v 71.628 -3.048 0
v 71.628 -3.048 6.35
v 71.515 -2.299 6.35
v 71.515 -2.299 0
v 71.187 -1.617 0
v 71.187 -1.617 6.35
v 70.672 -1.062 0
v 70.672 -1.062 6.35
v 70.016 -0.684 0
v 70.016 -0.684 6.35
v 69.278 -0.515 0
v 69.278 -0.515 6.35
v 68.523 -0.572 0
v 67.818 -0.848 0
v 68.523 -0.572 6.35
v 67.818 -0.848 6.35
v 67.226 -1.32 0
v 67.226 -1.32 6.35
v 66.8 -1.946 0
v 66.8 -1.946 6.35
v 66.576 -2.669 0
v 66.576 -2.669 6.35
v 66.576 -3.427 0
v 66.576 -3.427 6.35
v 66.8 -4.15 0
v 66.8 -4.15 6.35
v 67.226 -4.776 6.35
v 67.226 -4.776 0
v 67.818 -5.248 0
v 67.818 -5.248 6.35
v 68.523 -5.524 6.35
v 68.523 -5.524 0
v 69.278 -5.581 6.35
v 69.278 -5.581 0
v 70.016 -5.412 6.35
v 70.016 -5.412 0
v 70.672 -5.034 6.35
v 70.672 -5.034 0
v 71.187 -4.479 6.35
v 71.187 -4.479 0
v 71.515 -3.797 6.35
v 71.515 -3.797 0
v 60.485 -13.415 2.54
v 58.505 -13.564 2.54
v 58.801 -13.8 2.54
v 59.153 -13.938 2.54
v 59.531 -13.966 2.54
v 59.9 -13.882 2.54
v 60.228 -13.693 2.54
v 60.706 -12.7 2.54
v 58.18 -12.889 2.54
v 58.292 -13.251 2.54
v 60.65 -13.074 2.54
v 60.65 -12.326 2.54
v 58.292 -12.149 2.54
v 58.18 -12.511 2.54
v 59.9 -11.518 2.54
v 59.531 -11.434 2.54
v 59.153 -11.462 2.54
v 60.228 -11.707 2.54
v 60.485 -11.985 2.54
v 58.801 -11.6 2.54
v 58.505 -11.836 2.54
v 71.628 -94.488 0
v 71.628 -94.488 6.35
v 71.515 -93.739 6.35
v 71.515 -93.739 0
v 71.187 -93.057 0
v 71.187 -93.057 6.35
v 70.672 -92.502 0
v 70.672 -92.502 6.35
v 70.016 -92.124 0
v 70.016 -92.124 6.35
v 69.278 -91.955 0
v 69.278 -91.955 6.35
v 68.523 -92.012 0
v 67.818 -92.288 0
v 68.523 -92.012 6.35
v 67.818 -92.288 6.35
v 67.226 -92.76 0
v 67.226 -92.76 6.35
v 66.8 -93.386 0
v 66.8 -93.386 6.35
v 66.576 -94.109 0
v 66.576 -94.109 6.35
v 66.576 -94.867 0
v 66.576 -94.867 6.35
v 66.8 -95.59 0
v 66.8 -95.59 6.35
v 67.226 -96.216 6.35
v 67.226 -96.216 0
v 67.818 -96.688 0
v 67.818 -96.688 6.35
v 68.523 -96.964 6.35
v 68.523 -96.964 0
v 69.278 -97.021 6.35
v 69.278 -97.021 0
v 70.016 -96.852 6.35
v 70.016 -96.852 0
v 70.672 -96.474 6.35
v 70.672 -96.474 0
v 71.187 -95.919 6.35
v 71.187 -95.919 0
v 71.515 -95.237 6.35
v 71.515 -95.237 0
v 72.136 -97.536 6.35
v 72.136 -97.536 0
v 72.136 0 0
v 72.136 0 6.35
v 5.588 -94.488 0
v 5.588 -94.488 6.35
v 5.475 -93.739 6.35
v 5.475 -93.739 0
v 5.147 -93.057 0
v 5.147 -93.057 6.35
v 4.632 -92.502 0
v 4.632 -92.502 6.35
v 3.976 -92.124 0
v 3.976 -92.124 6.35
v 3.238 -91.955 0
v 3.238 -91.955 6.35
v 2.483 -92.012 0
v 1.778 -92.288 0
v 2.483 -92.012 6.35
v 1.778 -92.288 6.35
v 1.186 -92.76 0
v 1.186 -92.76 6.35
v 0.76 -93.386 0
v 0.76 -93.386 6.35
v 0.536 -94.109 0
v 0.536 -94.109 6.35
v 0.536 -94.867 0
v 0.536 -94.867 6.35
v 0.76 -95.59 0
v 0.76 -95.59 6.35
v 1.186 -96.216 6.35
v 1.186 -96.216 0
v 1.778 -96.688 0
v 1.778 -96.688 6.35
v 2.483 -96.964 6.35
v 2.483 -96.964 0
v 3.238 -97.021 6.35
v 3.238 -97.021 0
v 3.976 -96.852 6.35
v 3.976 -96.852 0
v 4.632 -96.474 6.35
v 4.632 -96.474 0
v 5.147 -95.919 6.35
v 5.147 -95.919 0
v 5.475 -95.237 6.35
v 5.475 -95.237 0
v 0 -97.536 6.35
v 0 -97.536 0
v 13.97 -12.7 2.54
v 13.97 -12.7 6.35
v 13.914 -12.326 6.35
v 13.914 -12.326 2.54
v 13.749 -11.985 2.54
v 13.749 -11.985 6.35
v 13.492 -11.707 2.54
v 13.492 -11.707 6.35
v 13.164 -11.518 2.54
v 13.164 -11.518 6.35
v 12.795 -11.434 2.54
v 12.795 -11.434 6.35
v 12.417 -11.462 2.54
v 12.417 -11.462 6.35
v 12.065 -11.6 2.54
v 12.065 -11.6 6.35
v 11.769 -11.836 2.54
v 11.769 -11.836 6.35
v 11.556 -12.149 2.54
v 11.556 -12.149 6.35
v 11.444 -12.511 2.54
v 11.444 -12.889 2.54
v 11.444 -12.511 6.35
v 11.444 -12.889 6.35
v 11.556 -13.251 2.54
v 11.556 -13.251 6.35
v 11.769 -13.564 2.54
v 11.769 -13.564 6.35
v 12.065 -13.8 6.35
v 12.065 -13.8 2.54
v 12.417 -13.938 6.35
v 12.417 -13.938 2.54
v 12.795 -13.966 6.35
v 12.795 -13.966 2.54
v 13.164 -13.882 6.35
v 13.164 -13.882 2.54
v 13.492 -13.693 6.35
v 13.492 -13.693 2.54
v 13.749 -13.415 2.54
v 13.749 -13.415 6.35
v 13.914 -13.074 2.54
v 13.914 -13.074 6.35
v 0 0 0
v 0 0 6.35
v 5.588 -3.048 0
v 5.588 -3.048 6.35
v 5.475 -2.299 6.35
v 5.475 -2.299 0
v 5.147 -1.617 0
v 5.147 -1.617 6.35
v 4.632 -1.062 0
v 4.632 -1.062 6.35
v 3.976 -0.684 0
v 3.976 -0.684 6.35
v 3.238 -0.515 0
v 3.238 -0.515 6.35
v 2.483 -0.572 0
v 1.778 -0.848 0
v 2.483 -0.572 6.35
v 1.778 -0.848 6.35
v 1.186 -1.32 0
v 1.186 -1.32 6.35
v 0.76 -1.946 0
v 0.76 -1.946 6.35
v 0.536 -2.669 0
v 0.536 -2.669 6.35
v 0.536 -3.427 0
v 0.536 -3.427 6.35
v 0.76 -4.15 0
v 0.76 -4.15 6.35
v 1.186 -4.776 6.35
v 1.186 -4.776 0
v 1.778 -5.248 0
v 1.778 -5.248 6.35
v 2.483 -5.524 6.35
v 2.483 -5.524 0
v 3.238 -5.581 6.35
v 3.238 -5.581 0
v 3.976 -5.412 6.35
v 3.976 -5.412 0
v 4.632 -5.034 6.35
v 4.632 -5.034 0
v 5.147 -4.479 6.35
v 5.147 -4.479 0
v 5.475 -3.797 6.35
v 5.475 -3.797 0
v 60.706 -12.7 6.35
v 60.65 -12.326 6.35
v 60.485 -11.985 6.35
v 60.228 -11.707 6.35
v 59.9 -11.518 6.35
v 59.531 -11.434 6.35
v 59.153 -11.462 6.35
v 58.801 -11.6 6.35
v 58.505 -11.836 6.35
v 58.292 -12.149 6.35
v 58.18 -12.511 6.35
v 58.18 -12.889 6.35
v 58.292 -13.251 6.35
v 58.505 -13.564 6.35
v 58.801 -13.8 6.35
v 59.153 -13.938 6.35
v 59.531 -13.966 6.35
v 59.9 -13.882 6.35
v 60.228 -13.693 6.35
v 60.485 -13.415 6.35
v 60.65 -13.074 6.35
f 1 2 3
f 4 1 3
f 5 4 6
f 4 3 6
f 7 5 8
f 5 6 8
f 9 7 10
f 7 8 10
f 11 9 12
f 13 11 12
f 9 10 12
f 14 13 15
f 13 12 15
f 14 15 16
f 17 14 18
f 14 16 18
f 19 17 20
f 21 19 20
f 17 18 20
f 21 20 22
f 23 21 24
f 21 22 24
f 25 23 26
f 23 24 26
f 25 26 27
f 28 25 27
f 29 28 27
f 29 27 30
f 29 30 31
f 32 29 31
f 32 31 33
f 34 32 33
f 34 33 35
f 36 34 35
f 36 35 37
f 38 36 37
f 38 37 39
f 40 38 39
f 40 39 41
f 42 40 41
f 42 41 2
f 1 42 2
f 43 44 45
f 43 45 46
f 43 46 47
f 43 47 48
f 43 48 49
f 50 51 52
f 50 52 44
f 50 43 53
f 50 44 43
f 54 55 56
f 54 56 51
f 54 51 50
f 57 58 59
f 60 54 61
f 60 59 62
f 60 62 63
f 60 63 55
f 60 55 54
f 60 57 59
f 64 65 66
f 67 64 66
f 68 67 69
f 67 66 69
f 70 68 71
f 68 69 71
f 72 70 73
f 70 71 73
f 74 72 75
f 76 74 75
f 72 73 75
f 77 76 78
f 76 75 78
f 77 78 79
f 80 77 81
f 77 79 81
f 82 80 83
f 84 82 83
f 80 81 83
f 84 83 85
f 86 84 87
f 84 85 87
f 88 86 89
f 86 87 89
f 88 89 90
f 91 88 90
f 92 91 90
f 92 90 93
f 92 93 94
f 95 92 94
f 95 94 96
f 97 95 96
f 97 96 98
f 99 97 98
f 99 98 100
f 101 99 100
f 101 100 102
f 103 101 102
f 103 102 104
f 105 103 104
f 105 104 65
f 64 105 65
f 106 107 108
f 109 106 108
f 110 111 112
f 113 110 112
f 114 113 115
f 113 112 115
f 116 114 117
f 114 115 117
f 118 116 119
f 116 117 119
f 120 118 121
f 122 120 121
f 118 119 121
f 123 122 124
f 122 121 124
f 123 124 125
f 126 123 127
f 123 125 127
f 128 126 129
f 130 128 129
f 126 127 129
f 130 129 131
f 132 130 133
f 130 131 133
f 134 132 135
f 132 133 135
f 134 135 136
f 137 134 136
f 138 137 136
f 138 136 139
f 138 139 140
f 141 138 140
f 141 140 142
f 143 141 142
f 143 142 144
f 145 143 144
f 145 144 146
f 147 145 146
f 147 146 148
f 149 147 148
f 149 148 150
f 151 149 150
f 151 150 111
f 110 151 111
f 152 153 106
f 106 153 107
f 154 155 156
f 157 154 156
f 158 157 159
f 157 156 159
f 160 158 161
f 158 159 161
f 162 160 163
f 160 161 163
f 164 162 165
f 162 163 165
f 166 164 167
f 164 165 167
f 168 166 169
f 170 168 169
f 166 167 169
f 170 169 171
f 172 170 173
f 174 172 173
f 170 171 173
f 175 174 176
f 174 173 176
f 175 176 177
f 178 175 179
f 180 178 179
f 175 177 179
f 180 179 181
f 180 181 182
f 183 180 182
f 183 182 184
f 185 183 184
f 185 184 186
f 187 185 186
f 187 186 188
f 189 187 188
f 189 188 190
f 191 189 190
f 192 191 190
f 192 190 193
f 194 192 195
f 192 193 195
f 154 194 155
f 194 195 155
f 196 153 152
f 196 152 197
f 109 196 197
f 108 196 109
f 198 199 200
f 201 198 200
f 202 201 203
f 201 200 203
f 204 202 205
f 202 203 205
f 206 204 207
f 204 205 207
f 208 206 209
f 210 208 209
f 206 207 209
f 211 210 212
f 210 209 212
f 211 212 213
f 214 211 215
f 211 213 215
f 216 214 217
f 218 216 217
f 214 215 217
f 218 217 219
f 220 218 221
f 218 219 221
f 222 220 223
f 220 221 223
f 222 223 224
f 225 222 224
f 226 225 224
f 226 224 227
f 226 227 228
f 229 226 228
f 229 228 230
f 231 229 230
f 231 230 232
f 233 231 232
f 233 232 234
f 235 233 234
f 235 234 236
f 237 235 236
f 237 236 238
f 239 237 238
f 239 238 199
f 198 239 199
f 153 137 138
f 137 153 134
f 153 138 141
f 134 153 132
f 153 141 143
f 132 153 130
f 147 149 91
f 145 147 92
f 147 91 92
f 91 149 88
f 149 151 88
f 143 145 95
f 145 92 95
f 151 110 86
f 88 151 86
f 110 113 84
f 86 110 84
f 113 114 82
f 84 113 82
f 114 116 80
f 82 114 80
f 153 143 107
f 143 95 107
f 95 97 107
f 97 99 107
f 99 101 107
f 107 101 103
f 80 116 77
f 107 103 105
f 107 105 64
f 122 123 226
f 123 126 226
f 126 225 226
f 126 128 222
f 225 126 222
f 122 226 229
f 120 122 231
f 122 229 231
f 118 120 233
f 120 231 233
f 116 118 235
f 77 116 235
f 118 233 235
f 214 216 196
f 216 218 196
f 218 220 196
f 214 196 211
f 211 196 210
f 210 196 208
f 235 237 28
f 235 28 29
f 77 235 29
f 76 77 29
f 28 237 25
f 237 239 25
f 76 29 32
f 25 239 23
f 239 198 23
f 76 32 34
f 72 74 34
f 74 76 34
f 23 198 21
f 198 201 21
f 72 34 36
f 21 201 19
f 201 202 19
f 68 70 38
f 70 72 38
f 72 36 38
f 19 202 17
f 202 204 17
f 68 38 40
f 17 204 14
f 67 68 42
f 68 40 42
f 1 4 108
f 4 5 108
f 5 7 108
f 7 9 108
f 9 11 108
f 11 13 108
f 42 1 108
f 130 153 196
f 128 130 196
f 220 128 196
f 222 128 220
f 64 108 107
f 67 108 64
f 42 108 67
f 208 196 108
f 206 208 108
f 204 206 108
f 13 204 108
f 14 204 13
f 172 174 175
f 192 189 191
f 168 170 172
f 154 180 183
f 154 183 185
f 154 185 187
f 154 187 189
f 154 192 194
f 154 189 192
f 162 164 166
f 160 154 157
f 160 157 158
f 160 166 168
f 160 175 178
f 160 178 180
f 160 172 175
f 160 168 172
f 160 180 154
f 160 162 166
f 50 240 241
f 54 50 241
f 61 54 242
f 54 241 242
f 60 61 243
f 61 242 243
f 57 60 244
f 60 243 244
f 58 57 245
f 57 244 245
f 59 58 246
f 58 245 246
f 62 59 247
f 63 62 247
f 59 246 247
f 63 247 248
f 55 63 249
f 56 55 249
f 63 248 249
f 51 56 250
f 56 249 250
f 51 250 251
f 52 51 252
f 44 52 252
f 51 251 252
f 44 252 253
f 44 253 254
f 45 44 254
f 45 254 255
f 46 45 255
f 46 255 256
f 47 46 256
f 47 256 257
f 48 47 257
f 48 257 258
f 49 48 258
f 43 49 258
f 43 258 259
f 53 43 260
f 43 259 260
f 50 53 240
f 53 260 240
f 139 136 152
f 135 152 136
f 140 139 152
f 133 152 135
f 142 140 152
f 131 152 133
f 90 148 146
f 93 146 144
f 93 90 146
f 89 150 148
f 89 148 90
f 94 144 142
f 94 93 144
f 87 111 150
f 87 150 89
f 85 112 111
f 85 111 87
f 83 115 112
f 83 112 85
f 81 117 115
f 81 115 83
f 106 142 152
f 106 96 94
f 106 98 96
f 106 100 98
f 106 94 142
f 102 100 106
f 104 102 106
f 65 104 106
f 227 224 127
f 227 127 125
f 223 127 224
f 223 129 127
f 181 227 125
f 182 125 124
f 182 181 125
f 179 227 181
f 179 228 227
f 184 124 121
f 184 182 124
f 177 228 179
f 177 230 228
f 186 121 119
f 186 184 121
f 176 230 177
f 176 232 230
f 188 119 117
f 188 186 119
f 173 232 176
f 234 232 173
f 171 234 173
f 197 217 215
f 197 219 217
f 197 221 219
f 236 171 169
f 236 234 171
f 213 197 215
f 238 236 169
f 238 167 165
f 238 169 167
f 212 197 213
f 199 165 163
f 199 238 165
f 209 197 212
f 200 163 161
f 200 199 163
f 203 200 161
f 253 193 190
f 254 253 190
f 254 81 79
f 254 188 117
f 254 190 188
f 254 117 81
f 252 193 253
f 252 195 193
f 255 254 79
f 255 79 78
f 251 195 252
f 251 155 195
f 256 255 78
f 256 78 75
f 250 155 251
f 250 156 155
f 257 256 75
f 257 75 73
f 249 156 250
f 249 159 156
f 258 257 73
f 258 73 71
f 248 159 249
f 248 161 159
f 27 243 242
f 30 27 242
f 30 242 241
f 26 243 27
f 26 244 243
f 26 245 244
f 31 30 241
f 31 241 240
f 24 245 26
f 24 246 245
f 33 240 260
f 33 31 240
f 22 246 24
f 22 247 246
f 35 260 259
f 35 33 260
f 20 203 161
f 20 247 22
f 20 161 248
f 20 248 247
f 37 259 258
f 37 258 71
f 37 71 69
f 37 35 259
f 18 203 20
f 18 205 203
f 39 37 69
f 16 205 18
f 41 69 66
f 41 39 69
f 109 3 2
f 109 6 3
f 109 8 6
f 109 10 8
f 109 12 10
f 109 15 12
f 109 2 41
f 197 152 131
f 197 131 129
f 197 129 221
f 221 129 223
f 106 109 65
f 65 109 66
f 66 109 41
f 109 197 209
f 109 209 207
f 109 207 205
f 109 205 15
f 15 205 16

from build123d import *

# Parameters (mm, degrees)
SKETCH1_W           = 72.136
SKETCH1_H           = 97.536
BOSS_EXTRUDE1_DEPTH = 6.35
CUT_EXTRUDE4_REACH  = 123.479
SKETCH12_R          = 2.54
SKETCH13_R          = 1.27
CUT_EXTRUDE5_DEPTH  = 3.81


with BuildPart() as part:
    # Sketch1 → Boss-Extrude1 (new body)
    with BuildSketch(Plane.XY):
        with Locations((36.068, -48.768)):
            Rectangle(SKETCH1_W, SKETCH1_H)
    extrude(amount=BOSS_EXTRUDE1_DEPTH)

    # Sketch12 → Cut-Extrude4 (cut, up to next)
    with BuildSketch(Plane.XY.offset(6.35), mode=Mode.PRIVATE) as cut_extrude4_sk1:
        with Locations((3.048, -3.048)):
            Circle(SKETCH12_R)
    cut_extrude4_tool1 = extrude(cut_extrude4_sk1.sketch, amount=-CUT_EXTRUDE4_REACH, mode=Mode.PRIVATE) & part.part
    # Sketch12 → Cut-Extrude4 (cut, up to next)
    with BuildSketch(Plane.XY.offset(6.35), mode=Mode.PRIVATE) as cut_extrude4_sk2:
        with Locations((69.088, -3.048)):
            Circle(SKETCH12_R)
    cut_extrude4_tool2 = extrude(cut_extrude4_sk2.sketch, amount=-CUT_EXTRUDE4_REACH, mode=Mode.PRIVATE) & part.part
    # Sketch12 → Cut-Extrude4 (cut, up to next)
    with BuildSketch(Plane.XY.offset(6.35), mode=Mode.PRIVATE) as cut_extrude4_sk3:
        with Locations((69.088, -94.488)):
            Circle(SKETCH12_R)
    cut_extrude4_tool3 = extrude(cut_extrude4_sk3.sketch, amount=-CUT_EXTRUDE4_REACH, mode=Mode.PRIVATE) & part.part
    # Sketch12 → Cut-Extrude4 (cut, up to next)
    with BuildSketch(Plane.XY.offset(6.35), mode=Mode.PRIVATE) as cut_extrude4_sk4:
        with Locations((3.048, -94.488)):
            Circle(SKETCH12_R)
    cut_extrude4_tool4 = extrude(cut_extrude4_sk4.sketch, amount=-CUT_EXTRUDE4_REACH, mode=Mode.PRIVATE) & part.part
    add(cut_extrude4_tool1.solids().sort_by_distance((3.048, -3.048, 6.35))[0], mode=Mode.SUBTRACT)
    add(cut_extrude4_tool2.solids().sort_by_distance((69.088, -3.048, 6.35))[0], mode=Mode.SUBTRACT)
    add(cut_extrude4_tool3.solids().sort_by_distance((69.088, -94.488, 6.35))[0], mode=Mode.SUBTRACT)
    add(cut_extrude4_tool4.solids().sort_by_distance((3.048, -94.488, 6.35))[0], mode=Mode.SUBTRACT)

    # Sketch13 → Cut-Extrude5 (cut)
    with BuildSketch(Plane.XY.offset(6.35)):
        with Locations((12.7, -12.7)):
            Circle(SKETCH13_R)
        with Locations((59.436, -12.7)):
            Circle(SKETCH13_R)
    extrude(amount=-CUT_EXTRUDE5_DEPTH, mode=Mode.SUBTRACT)


solid = part.part
